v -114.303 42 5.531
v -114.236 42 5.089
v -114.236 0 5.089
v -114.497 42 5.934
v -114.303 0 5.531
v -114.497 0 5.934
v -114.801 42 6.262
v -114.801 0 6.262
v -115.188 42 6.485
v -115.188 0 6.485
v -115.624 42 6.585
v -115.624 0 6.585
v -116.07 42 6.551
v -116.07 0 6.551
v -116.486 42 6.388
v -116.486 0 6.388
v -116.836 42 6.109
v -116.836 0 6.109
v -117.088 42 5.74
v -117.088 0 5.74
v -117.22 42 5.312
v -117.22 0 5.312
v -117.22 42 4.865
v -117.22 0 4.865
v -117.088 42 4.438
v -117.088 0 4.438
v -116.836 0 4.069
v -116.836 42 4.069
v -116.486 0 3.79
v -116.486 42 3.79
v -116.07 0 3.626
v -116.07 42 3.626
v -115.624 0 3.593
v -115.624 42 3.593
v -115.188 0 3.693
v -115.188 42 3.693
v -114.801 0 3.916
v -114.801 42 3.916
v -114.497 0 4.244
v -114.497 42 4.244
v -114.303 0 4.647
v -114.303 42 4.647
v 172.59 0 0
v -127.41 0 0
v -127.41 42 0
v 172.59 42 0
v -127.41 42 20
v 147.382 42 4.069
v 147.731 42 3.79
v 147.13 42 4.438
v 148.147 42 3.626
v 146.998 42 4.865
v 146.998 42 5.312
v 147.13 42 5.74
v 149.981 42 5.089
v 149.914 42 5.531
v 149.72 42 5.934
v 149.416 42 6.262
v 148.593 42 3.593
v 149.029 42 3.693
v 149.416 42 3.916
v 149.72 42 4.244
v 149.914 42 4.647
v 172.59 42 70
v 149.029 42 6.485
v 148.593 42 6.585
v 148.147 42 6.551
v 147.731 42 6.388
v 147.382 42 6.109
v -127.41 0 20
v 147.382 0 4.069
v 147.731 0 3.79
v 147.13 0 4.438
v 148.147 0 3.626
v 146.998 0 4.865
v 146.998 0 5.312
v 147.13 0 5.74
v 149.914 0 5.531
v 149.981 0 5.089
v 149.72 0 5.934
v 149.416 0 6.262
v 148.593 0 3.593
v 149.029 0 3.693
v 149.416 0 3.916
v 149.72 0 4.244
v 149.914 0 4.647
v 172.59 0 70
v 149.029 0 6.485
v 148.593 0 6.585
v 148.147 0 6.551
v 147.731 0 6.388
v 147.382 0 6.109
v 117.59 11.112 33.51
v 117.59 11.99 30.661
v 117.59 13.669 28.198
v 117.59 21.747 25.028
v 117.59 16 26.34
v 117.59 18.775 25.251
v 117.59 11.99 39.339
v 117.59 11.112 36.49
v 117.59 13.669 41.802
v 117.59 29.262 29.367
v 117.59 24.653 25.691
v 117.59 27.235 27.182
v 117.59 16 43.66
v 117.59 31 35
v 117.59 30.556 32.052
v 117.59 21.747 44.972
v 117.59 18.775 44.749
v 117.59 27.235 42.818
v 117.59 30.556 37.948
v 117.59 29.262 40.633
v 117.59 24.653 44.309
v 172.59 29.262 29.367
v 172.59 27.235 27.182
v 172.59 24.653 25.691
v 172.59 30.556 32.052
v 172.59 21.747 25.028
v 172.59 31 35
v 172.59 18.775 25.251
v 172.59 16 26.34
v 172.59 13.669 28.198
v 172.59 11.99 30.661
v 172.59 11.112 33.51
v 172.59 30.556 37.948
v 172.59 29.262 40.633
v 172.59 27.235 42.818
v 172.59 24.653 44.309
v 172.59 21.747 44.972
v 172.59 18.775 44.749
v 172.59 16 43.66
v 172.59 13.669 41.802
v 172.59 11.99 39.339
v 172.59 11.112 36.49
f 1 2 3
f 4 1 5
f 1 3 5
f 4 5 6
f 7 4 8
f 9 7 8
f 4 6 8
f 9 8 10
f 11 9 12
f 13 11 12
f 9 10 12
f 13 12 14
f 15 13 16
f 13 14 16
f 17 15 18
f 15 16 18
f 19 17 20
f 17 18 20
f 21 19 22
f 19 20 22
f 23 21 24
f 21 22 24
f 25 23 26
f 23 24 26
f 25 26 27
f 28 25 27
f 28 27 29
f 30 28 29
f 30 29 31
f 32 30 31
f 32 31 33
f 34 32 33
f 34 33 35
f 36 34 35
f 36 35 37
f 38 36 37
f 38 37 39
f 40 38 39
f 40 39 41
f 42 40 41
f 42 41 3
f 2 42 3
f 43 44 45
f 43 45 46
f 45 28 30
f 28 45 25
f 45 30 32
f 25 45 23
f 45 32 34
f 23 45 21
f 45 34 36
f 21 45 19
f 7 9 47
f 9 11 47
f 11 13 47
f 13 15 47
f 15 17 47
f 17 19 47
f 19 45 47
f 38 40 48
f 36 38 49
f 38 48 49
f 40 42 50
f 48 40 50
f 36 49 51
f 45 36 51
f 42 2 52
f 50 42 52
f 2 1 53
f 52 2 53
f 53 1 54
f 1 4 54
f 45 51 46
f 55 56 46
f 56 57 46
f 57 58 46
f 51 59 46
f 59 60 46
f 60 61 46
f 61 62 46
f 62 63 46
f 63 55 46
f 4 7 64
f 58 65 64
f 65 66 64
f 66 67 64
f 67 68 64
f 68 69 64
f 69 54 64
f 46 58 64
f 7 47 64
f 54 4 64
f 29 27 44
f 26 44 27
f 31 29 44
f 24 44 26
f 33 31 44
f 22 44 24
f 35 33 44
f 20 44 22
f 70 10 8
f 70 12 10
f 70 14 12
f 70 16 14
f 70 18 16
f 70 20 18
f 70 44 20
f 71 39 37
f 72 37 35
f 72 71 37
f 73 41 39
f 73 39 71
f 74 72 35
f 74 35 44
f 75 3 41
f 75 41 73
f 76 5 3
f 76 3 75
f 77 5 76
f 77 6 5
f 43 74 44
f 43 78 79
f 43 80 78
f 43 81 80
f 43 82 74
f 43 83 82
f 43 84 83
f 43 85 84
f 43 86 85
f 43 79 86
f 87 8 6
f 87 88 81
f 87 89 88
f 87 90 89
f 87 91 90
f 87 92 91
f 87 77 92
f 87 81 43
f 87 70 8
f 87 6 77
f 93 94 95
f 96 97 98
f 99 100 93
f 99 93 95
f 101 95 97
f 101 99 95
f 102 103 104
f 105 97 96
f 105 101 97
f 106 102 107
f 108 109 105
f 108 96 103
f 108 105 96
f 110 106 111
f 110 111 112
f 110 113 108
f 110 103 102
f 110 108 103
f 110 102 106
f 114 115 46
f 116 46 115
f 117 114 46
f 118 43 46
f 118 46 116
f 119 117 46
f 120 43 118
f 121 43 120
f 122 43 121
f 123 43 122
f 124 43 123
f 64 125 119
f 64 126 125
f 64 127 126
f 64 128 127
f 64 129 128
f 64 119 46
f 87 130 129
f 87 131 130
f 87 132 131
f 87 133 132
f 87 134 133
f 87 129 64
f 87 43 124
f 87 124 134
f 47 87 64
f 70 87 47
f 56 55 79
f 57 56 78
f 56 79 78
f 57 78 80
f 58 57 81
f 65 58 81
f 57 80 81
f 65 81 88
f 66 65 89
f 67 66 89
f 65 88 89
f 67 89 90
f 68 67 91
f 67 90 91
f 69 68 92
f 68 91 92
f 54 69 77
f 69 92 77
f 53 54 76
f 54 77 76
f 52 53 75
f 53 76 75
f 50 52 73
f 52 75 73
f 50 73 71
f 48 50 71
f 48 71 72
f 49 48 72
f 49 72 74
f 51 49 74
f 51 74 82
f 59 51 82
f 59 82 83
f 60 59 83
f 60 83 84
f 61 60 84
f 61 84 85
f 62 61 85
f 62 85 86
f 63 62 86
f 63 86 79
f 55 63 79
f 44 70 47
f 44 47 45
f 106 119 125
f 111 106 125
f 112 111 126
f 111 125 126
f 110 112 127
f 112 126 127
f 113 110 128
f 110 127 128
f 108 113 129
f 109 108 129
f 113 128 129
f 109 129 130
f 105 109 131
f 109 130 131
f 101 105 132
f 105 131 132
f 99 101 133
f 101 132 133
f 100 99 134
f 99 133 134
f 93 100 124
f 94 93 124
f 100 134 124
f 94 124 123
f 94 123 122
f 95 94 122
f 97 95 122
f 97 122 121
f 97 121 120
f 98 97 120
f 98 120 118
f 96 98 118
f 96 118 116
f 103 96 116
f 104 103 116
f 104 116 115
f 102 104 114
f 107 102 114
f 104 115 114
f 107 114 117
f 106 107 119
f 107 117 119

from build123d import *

# Parameters (mm, degrees)
F1_DEPTH = 42
F2_R     = 10
F3_DEPTH = 55
F4_R     = 1.5
F5_DEPTH = 197.5


with BuildPart() as f1:
    # F0 (on Front) → F1 (new body)
    with BuildSketch(Plane.XZ):
        Polygon((-127.40964, 0), (172.59036, 0), (172.59036, 70), (-127.40964, 20), align=None)
    extrude(amount=-F1_DEPTH)

    # F2 (on face) → F3 (cut)
    with BuildSketch(Plane.YZ.offset(172.59036)):
        with Locations((21, 35)):
            Circle(F2_R)
    extrude(amount=-F3_DEPTH, mode=Mode.SUBTRACT)

    # F4 (on face) → F5 (cut)
    with BuildSketch(Plane.XZ):
        with Locations((-115.736268, 5.088853)):
            Circle(F4_R)
        with Locations((148.481086, 5.088853)):
            Circle(F4_R)
    extrude(amount=-F5_DEPTH, mode=Mode.SUBTRACT)


solid = f1.part
